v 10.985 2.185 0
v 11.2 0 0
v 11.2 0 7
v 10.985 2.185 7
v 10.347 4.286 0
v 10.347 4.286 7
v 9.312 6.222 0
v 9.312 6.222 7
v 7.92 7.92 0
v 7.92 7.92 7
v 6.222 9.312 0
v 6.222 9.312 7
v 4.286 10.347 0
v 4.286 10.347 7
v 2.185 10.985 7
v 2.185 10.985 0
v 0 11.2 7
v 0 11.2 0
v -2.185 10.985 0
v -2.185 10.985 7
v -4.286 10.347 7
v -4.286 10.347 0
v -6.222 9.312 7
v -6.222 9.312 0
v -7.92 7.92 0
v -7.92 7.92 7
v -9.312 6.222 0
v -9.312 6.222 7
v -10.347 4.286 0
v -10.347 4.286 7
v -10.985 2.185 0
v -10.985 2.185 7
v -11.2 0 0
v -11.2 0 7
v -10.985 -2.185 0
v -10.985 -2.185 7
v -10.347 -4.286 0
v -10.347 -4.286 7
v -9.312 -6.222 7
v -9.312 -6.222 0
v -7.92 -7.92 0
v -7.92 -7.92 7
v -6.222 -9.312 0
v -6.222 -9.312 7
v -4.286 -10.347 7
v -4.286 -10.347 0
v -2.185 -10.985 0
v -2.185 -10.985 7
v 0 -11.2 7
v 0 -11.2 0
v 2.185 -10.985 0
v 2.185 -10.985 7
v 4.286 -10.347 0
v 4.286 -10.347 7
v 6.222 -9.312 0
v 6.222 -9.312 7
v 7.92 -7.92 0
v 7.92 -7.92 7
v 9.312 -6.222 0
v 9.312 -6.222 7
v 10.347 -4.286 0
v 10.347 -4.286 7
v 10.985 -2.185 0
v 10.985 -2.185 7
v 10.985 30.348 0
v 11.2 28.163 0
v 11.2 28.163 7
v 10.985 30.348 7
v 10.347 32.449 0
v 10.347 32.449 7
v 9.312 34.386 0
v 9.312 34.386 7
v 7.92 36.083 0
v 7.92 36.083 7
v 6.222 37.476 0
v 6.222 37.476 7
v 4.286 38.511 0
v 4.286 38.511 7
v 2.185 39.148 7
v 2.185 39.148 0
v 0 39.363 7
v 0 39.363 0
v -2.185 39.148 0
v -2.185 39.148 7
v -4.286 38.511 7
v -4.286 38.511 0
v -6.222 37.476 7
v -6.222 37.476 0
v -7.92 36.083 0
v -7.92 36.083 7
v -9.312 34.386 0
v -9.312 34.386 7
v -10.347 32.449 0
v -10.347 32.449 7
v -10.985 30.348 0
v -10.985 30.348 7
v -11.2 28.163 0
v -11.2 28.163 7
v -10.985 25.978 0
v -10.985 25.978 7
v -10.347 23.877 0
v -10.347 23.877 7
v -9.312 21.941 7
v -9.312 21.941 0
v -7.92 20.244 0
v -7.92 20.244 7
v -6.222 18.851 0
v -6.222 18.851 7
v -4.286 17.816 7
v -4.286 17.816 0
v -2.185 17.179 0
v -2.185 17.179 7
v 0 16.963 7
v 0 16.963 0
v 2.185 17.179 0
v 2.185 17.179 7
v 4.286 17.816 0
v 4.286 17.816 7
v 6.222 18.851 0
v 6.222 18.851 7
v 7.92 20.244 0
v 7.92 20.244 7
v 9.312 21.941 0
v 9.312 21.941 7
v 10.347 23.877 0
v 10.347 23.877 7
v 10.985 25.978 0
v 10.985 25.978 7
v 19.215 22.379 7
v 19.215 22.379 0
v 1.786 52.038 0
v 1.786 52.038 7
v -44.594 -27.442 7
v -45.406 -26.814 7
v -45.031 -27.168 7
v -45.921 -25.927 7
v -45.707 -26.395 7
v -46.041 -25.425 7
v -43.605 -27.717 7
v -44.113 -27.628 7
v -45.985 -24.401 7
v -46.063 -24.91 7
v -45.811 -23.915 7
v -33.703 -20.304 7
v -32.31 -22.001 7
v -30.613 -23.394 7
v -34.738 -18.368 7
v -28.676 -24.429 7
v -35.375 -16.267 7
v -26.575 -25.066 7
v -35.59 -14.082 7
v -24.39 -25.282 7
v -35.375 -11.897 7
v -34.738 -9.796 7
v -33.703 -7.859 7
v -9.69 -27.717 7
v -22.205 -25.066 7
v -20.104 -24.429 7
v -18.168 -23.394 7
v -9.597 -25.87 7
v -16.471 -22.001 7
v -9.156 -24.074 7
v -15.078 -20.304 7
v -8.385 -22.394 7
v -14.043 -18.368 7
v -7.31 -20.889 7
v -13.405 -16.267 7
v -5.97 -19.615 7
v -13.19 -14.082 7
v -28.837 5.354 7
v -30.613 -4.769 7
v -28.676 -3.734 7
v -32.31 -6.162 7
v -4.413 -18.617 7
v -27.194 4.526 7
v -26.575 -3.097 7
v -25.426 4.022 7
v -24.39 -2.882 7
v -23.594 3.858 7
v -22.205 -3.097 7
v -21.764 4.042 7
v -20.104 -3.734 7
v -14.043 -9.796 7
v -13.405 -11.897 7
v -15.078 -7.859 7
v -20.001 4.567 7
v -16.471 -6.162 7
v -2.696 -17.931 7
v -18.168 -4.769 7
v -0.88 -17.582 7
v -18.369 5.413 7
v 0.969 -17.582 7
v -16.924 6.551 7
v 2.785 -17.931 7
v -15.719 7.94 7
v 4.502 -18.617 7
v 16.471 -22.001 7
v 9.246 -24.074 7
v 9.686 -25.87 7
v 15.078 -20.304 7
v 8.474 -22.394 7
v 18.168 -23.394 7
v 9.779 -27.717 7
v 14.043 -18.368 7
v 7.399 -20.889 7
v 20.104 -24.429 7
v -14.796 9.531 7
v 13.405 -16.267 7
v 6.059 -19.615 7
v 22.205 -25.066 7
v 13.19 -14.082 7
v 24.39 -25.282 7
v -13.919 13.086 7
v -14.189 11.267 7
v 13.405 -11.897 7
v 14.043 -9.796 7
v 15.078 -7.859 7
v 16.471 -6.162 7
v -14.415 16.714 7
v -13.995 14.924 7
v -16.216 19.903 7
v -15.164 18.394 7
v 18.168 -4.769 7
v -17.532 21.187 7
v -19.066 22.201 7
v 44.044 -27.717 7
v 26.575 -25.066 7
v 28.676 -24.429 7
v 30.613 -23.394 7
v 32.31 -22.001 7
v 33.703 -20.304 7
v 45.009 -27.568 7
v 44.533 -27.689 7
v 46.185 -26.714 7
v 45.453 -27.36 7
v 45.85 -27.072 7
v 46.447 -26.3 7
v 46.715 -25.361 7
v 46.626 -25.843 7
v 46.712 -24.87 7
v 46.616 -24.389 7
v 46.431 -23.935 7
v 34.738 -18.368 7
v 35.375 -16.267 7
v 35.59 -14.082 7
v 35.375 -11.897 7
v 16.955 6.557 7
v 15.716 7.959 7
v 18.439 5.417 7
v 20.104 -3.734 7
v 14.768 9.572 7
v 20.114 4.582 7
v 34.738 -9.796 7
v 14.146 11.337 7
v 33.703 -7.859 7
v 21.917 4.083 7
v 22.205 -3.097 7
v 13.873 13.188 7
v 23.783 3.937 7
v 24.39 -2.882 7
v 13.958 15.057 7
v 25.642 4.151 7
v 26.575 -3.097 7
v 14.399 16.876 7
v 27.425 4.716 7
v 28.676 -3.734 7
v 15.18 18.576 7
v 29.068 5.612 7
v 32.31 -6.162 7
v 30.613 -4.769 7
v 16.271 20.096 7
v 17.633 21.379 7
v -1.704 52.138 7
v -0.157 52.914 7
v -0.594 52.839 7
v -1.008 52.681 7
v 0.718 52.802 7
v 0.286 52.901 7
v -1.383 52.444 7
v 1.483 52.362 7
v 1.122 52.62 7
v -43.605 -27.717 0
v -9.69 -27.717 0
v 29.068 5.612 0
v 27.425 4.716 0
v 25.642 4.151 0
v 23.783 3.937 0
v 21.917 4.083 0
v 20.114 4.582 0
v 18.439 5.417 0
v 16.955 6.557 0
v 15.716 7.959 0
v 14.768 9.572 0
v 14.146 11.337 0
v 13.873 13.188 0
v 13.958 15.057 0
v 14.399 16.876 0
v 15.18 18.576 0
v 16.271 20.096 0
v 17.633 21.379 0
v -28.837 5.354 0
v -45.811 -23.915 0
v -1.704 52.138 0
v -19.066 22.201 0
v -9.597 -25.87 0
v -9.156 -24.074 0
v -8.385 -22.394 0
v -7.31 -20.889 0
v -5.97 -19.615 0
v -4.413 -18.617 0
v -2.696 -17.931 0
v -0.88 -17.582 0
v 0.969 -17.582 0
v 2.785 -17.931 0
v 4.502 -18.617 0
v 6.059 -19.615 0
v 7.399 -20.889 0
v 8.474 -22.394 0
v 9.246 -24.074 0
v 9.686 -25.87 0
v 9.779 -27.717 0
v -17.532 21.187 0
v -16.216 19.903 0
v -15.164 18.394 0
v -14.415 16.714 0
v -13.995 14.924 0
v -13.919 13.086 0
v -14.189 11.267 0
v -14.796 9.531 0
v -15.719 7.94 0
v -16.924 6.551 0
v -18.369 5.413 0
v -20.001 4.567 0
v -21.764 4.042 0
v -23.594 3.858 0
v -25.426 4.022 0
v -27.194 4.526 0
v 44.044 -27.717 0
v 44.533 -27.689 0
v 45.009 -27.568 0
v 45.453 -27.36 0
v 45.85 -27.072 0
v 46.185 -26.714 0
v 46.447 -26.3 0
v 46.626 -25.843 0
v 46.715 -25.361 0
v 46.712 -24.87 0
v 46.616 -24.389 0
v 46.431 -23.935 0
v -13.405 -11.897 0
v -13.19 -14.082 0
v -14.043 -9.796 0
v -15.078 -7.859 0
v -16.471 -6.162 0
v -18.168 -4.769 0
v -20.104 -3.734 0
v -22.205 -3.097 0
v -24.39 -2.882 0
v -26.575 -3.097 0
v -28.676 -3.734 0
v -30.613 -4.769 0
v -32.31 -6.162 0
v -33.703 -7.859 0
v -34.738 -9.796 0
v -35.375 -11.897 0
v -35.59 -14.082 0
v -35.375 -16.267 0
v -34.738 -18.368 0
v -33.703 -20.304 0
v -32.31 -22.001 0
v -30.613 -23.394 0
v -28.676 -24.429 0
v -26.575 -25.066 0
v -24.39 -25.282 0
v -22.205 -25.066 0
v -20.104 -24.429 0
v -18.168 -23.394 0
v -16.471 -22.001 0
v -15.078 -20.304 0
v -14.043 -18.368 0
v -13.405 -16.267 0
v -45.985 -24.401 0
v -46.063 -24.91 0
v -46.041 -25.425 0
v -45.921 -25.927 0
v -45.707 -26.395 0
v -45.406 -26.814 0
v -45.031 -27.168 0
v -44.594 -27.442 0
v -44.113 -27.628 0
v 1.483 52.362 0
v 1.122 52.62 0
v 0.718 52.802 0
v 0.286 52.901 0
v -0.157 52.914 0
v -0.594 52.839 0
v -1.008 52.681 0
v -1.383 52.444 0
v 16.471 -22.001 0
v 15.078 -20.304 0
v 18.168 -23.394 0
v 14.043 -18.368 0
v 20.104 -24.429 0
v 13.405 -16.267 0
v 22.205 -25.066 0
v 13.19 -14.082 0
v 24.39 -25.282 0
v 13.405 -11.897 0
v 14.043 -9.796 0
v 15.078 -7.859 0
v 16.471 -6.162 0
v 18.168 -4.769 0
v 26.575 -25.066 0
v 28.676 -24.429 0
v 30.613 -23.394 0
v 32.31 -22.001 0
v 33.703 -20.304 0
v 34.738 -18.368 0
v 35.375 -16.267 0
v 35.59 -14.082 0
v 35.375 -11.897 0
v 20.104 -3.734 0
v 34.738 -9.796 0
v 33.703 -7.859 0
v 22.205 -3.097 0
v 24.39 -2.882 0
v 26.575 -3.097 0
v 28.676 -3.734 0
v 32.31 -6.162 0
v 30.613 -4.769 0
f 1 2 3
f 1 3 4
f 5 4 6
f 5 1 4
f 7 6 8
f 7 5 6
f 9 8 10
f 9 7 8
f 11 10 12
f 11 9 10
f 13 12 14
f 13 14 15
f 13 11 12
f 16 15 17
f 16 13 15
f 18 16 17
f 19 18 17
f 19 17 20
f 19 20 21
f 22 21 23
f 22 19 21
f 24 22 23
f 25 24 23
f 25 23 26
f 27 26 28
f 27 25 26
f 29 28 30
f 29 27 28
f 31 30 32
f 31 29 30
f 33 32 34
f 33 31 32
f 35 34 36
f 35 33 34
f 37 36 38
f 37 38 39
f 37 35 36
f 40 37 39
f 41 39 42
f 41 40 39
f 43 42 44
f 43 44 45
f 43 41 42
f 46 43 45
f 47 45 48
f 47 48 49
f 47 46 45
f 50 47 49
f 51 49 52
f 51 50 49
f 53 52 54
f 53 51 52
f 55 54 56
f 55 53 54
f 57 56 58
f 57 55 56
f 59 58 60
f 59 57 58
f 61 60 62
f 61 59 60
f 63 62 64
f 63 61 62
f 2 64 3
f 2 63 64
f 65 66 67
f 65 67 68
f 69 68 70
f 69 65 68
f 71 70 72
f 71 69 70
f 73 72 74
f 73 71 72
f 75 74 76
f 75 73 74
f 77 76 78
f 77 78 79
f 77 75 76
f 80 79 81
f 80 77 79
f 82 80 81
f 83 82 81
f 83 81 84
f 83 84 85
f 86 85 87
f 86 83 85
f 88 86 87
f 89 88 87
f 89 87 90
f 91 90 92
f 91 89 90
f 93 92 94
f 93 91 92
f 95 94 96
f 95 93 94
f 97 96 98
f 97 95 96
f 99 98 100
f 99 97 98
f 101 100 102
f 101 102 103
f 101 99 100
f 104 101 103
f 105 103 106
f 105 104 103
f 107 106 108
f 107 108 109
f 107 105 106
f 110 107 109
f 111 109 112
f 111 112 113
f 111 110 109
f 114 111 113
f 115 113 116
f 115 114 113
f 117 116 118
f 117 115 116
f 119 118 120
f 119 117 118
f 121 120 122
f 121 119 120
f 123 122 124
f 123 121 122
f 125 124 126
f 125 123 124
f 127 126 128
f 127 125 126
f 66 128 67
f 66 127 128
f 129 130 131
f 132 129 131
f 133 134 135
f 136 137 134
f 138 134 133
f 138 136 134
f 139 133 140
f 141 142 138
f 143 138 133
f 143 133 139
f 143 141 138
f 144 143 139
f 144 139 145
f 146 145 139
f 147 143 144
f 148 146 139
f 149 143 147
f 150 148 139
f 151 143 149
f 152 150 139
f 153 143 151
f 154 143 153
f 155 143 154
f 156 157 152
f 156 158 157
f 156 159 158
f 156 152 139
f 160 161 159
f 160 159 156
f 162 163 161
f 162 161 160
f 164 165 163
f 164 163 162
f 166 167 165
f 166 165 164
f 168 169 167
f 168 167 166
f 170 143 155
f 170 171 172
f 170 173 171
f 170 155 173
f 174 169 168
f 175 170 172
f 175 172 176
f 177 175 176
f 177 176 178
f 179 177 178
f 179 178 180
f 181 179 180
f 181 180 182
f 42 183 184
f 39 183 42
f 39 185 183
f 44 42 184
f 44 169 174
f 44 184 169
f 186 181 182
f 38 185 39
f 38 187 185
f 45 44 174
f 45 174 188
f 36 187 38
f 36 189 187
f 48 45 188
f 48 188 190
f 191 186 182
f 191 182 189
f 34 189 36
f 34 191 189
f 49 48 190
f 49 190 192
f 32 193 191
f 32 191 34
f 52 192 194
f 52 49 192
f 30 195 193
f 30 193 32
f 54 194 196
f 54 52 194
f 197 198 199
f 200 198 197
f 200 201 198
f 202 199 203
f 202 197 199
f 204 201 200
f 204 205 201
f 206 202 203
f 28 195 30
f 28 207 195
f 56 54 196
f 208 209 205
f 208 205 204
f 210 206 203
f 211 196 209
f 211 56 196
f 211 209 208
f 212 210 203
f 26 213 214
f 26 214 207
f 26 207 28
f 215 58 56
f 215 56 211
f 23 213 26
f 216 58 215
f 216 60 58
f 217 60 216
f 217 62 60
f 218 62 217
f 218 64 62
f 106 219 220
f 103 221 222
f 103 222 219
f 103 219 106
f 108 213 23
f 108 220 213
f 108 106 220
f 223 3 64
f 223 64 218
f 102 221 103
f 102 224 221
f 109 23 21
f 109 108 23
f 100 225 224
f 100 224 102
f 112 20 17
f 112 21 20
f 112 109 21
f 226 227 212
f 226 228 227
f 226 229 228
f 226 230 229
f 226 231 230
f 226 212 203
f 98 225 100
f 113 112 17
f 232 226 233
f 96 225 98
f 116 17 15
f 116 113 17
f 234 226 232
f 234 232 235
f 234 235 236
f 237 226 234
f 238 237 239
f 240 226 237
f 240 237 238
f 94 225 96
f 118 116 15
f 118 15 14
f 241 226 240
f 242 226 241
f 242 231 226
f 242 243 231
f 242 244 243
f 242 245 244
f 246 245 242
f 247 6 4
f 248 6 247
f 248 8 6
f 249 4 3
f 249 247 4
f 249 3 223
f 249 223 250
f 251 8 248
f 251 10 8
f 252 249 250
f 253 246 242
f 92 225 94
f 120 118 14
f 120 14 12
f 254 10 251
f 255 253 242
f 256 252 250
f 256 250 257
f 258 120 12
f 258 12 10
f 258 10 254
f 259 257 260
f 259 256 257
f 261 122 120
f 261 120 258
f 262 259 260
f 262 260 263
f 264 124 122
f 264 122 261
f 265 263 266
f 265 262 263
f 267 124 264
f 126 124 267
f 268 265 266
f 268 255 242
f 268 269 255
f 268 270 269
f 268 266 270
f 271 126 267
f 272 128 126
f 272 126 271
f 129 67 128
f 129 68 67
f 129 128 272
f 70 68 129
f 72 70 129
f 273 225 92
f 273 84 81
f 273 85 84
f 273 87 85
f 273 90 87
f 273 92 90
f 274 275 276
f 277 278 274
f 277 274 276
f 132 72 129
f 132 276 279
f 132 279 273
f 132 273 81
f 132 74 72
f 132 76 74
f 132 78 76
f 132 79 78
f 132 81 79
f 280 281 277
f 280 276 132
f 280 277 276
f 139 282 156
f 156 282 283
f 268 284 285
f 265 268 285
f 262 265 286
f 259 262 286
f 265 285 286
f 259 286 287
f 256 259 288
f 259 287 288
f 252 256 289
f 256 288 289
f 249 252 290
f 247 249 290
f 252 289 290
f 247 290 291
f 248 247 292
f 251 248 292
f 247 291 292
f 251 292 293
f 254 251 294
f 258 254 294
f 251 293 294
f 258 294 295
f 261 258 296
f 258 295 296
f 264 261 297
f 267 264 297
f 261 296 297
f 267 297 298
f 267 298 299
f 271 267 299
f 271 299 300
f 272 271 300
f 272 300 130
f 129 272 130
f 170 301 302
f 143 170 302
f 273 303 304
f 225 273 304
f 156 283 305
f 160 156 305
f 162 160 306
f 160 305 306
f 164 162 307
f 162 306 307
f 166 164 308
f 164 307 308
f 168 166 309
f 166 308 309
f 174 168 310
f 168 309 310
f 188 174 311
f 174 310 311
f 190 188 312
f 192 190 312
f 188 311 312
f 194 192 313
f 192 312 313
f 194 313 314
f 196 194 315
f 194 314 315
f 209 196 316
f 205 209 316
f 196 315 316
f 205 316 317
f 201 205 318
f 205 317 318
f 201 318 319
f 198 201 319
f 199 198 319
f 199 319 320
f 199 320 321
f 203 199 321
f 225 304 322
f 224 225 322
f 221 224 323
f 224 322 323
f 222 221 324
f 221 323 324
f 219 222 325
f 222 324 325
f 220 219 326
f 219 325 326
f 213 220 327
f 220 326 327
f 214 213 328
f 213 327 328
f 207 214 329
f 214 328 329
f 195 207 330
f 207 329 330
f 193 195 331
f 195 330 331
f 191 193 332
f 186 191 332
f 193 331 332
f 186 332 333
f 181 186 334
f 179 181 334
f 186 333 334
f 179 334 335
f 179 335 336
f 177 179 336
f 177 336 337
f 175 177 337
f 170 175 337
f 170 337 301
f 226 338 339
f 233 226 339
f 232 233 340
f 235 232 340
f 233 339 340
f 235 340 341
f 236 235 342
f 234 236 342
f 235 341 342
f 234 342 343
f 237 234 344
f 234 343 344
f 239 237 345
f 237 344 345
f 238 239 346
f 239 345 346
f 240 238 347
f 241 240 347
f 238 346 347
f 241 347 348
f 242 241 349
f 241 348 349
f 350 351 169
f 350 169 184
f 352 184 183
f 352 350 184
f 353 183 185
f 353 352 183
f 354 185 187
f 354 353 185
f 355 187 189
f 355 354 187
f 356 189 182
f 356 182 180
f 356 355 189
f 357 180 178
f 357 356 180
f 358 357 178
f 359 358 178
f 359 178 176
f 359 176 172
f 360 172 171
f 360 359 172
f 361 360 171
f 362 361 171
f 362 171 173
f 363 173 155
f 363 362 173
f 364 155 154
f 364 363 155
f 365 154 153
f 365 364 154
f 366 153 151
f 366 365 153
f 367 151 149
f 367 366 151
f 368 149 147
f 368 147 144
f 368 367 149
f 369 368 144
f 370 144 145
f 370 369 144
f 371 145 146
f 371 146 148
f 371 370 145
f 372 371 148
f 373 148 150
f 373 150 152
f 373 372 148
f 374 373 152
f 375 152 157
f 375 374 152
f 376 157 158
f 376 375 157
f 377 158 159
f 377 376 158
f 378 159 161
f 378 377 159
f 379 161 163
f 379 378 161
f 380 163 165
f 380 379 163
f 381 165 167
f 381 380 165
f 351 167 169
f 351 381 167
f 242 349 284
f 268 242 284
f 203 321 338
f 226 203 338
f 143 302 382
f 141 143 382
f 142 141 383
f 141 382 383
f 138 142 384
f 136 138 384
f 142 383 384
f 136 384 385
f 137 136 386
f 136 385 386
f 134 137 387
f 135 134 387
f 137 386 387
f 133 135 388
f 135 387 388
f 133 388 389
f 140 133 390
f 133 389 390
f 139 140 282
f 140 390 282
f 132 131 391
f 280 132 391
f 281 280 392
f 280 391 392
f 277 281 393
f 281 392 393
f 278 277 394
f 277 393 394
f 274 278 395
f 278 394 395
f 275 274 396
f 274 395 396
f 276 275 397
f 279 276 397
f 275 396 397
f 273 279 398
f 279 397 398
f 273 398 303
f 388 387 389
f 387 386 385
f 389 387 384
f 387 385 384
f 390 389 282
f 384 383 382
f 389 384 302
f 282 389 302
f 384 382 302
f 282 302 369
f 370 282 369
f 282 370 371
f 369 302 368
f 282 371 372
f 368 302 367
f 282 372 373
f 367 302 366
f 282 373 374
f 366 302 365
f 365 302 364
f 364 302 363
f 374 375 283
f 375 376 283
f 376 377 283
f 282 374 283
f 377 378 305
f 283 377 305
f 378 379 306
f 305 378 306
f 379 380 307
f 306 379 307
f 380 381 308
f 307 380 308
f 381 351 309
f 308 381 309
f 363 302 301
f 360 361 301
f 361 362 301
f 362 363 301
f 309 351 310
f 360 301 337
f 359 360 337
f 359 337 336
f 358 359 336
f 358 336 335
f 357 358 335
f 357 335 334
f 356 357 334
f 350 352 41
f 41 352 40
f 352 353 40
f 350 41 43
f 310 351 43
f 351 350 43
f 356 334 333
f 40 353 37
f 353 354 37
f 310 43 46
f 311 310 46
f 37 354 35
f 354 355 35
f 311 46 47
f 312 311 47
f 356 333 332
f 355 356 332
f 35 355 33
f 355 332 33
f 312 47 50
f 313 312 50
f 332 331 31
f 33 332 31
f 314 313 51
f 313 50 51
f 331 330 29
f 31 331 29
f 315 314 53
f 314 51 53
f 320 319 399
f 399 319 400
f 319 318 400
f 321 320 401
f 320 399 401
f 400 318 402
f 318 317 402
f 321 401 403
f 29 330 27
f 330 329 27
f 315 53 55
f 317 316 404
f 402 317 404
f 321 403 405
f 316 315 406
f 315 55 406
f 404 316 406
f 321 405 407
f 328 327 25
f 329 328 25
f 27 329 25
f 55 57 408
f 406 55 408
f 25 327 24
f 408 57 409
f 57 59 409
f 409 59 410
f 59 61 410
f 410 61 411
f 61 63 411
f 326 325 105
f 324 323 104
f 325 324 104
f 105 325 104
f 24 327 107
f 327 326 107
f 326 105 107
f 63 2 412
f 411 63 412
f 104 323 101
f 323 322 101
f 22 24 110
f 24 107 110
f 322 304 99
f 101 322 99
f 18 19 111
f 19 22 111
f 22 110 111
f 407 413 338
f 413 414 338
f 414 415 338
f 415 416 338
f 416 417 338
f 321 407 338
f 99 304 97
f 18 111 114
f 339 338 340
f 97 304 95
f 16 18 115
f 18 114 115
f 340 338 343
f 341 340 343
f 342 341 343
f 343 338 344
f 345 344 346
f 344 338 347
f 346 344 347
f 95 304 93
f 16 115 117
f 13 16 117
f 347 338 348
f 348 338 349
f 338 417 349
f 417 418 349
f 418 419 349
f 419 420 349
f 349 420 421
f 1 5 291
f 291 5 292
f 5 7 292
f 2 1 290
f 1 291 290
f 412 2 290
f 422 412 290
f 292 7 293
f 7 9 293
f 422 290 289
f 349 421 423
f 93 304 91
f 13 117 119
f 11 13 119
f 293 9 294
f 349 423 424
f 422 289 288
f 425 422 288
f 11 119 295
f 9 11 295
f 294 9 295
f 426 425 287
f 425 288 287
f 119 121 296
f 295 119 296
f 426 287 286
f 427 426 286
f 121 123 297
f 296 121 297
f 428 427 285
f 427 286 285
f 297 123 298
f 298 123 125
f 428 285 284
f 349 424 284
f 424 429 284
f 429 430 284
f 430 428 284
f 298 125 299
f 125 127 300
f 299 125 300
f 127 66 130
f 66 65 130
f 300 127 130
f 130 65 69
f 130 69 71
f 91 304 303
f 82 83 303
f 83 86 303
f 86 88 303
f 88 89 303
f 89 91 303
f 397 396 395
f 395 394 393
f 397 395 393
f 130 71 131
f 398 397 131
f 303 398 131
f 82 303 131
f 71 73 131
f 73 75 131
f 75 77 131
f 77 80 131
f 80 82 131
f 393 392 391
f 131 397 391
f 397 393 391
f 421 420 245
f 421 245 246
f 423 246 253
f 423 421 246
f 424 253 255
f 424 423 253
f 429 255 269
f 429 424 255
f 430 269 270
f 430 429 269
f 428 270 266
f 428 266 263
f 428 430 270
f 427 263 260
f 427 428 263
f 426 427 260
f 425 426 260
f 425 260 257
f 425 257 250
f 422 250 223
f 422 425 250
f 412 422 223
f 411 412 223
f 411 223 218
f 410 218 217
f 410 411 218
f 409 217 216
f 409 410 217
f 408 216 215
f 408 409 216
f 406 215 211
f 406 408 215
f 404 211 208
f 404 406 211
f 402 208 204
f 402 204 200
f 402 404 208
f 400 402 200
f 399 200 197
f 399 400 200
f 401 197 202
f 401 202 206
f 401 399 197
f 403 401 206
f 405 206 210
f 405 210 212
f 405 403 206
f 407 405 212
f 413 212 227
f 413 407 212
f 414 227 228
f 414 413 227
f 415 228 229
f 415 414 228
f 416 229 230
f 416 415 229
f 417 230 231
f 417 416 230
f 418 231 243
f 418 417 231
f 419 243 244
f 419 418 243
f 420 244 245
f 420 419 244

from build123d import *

# Parameters (mm, degrees)
F0_R     = 11.2
F1_DEPTH = 7


with BuildPart() as f1:
    # F0 (on Top) → F1 (new body)
    with BuildSketch(Plane.XY):
        with BuildLine():
            ThreePointArc((1.78587, 52.038384), (0.064532, 52.918286), (-1.704408, 52.138489))
            Line((-1.704408, 52.138489), (-19.066227, 22.201317))
            ThreePointArc((-19.066227, 22.201317), (-15.219751, 8.713844), (-28.836632, 5.354102))
            Line((-28.836632, 5.354102), (-45.811212, -23.915348))
            ThreePointArc((-45.811212, -23.915348), (-45.706618, -26.395442), (-43.605451, -27.717147))
            Line((-43.605451, -27.717147), (-9.689672, -27.717147))
            ThreePointArc((-9.689672, -27.717147), (0.044547, -17.537595), (9.778766, -27.717147))
            Line((9.778766, -27.717147), (44.043854, -27.717147))
            ThreePointArc((44.043854, -27.717147), (46.3259, -26.513132), (46.431202, -23.935091))
            Line((46.431202, -23.935091), (29.068287, 5.61158))
            ThreePointArc((29.068287, 5.61158), (15.203422, 8.742665), (19.215132, 22.378807))
            Line((19.215132, 22.378807), (1.78587, 52.038384))
        make_face()
        with Locations((-24.390228, -14.081704)):
            Circle(F0_R, mode=Mode.SUBTRACT)
        Circle(F0_R, mode=Mode.SUBTRACT)
        with Locations((24.390229, -14.081704)):
            Circle(F0_R, mode=Mode.SUBTRACT)
        with Locations((0, 28.163411)):
            Circle(F0_R, mode=Mode.SUBTRACT)
    extrude(amount=F1_DEPTH)


solid = f1.part
